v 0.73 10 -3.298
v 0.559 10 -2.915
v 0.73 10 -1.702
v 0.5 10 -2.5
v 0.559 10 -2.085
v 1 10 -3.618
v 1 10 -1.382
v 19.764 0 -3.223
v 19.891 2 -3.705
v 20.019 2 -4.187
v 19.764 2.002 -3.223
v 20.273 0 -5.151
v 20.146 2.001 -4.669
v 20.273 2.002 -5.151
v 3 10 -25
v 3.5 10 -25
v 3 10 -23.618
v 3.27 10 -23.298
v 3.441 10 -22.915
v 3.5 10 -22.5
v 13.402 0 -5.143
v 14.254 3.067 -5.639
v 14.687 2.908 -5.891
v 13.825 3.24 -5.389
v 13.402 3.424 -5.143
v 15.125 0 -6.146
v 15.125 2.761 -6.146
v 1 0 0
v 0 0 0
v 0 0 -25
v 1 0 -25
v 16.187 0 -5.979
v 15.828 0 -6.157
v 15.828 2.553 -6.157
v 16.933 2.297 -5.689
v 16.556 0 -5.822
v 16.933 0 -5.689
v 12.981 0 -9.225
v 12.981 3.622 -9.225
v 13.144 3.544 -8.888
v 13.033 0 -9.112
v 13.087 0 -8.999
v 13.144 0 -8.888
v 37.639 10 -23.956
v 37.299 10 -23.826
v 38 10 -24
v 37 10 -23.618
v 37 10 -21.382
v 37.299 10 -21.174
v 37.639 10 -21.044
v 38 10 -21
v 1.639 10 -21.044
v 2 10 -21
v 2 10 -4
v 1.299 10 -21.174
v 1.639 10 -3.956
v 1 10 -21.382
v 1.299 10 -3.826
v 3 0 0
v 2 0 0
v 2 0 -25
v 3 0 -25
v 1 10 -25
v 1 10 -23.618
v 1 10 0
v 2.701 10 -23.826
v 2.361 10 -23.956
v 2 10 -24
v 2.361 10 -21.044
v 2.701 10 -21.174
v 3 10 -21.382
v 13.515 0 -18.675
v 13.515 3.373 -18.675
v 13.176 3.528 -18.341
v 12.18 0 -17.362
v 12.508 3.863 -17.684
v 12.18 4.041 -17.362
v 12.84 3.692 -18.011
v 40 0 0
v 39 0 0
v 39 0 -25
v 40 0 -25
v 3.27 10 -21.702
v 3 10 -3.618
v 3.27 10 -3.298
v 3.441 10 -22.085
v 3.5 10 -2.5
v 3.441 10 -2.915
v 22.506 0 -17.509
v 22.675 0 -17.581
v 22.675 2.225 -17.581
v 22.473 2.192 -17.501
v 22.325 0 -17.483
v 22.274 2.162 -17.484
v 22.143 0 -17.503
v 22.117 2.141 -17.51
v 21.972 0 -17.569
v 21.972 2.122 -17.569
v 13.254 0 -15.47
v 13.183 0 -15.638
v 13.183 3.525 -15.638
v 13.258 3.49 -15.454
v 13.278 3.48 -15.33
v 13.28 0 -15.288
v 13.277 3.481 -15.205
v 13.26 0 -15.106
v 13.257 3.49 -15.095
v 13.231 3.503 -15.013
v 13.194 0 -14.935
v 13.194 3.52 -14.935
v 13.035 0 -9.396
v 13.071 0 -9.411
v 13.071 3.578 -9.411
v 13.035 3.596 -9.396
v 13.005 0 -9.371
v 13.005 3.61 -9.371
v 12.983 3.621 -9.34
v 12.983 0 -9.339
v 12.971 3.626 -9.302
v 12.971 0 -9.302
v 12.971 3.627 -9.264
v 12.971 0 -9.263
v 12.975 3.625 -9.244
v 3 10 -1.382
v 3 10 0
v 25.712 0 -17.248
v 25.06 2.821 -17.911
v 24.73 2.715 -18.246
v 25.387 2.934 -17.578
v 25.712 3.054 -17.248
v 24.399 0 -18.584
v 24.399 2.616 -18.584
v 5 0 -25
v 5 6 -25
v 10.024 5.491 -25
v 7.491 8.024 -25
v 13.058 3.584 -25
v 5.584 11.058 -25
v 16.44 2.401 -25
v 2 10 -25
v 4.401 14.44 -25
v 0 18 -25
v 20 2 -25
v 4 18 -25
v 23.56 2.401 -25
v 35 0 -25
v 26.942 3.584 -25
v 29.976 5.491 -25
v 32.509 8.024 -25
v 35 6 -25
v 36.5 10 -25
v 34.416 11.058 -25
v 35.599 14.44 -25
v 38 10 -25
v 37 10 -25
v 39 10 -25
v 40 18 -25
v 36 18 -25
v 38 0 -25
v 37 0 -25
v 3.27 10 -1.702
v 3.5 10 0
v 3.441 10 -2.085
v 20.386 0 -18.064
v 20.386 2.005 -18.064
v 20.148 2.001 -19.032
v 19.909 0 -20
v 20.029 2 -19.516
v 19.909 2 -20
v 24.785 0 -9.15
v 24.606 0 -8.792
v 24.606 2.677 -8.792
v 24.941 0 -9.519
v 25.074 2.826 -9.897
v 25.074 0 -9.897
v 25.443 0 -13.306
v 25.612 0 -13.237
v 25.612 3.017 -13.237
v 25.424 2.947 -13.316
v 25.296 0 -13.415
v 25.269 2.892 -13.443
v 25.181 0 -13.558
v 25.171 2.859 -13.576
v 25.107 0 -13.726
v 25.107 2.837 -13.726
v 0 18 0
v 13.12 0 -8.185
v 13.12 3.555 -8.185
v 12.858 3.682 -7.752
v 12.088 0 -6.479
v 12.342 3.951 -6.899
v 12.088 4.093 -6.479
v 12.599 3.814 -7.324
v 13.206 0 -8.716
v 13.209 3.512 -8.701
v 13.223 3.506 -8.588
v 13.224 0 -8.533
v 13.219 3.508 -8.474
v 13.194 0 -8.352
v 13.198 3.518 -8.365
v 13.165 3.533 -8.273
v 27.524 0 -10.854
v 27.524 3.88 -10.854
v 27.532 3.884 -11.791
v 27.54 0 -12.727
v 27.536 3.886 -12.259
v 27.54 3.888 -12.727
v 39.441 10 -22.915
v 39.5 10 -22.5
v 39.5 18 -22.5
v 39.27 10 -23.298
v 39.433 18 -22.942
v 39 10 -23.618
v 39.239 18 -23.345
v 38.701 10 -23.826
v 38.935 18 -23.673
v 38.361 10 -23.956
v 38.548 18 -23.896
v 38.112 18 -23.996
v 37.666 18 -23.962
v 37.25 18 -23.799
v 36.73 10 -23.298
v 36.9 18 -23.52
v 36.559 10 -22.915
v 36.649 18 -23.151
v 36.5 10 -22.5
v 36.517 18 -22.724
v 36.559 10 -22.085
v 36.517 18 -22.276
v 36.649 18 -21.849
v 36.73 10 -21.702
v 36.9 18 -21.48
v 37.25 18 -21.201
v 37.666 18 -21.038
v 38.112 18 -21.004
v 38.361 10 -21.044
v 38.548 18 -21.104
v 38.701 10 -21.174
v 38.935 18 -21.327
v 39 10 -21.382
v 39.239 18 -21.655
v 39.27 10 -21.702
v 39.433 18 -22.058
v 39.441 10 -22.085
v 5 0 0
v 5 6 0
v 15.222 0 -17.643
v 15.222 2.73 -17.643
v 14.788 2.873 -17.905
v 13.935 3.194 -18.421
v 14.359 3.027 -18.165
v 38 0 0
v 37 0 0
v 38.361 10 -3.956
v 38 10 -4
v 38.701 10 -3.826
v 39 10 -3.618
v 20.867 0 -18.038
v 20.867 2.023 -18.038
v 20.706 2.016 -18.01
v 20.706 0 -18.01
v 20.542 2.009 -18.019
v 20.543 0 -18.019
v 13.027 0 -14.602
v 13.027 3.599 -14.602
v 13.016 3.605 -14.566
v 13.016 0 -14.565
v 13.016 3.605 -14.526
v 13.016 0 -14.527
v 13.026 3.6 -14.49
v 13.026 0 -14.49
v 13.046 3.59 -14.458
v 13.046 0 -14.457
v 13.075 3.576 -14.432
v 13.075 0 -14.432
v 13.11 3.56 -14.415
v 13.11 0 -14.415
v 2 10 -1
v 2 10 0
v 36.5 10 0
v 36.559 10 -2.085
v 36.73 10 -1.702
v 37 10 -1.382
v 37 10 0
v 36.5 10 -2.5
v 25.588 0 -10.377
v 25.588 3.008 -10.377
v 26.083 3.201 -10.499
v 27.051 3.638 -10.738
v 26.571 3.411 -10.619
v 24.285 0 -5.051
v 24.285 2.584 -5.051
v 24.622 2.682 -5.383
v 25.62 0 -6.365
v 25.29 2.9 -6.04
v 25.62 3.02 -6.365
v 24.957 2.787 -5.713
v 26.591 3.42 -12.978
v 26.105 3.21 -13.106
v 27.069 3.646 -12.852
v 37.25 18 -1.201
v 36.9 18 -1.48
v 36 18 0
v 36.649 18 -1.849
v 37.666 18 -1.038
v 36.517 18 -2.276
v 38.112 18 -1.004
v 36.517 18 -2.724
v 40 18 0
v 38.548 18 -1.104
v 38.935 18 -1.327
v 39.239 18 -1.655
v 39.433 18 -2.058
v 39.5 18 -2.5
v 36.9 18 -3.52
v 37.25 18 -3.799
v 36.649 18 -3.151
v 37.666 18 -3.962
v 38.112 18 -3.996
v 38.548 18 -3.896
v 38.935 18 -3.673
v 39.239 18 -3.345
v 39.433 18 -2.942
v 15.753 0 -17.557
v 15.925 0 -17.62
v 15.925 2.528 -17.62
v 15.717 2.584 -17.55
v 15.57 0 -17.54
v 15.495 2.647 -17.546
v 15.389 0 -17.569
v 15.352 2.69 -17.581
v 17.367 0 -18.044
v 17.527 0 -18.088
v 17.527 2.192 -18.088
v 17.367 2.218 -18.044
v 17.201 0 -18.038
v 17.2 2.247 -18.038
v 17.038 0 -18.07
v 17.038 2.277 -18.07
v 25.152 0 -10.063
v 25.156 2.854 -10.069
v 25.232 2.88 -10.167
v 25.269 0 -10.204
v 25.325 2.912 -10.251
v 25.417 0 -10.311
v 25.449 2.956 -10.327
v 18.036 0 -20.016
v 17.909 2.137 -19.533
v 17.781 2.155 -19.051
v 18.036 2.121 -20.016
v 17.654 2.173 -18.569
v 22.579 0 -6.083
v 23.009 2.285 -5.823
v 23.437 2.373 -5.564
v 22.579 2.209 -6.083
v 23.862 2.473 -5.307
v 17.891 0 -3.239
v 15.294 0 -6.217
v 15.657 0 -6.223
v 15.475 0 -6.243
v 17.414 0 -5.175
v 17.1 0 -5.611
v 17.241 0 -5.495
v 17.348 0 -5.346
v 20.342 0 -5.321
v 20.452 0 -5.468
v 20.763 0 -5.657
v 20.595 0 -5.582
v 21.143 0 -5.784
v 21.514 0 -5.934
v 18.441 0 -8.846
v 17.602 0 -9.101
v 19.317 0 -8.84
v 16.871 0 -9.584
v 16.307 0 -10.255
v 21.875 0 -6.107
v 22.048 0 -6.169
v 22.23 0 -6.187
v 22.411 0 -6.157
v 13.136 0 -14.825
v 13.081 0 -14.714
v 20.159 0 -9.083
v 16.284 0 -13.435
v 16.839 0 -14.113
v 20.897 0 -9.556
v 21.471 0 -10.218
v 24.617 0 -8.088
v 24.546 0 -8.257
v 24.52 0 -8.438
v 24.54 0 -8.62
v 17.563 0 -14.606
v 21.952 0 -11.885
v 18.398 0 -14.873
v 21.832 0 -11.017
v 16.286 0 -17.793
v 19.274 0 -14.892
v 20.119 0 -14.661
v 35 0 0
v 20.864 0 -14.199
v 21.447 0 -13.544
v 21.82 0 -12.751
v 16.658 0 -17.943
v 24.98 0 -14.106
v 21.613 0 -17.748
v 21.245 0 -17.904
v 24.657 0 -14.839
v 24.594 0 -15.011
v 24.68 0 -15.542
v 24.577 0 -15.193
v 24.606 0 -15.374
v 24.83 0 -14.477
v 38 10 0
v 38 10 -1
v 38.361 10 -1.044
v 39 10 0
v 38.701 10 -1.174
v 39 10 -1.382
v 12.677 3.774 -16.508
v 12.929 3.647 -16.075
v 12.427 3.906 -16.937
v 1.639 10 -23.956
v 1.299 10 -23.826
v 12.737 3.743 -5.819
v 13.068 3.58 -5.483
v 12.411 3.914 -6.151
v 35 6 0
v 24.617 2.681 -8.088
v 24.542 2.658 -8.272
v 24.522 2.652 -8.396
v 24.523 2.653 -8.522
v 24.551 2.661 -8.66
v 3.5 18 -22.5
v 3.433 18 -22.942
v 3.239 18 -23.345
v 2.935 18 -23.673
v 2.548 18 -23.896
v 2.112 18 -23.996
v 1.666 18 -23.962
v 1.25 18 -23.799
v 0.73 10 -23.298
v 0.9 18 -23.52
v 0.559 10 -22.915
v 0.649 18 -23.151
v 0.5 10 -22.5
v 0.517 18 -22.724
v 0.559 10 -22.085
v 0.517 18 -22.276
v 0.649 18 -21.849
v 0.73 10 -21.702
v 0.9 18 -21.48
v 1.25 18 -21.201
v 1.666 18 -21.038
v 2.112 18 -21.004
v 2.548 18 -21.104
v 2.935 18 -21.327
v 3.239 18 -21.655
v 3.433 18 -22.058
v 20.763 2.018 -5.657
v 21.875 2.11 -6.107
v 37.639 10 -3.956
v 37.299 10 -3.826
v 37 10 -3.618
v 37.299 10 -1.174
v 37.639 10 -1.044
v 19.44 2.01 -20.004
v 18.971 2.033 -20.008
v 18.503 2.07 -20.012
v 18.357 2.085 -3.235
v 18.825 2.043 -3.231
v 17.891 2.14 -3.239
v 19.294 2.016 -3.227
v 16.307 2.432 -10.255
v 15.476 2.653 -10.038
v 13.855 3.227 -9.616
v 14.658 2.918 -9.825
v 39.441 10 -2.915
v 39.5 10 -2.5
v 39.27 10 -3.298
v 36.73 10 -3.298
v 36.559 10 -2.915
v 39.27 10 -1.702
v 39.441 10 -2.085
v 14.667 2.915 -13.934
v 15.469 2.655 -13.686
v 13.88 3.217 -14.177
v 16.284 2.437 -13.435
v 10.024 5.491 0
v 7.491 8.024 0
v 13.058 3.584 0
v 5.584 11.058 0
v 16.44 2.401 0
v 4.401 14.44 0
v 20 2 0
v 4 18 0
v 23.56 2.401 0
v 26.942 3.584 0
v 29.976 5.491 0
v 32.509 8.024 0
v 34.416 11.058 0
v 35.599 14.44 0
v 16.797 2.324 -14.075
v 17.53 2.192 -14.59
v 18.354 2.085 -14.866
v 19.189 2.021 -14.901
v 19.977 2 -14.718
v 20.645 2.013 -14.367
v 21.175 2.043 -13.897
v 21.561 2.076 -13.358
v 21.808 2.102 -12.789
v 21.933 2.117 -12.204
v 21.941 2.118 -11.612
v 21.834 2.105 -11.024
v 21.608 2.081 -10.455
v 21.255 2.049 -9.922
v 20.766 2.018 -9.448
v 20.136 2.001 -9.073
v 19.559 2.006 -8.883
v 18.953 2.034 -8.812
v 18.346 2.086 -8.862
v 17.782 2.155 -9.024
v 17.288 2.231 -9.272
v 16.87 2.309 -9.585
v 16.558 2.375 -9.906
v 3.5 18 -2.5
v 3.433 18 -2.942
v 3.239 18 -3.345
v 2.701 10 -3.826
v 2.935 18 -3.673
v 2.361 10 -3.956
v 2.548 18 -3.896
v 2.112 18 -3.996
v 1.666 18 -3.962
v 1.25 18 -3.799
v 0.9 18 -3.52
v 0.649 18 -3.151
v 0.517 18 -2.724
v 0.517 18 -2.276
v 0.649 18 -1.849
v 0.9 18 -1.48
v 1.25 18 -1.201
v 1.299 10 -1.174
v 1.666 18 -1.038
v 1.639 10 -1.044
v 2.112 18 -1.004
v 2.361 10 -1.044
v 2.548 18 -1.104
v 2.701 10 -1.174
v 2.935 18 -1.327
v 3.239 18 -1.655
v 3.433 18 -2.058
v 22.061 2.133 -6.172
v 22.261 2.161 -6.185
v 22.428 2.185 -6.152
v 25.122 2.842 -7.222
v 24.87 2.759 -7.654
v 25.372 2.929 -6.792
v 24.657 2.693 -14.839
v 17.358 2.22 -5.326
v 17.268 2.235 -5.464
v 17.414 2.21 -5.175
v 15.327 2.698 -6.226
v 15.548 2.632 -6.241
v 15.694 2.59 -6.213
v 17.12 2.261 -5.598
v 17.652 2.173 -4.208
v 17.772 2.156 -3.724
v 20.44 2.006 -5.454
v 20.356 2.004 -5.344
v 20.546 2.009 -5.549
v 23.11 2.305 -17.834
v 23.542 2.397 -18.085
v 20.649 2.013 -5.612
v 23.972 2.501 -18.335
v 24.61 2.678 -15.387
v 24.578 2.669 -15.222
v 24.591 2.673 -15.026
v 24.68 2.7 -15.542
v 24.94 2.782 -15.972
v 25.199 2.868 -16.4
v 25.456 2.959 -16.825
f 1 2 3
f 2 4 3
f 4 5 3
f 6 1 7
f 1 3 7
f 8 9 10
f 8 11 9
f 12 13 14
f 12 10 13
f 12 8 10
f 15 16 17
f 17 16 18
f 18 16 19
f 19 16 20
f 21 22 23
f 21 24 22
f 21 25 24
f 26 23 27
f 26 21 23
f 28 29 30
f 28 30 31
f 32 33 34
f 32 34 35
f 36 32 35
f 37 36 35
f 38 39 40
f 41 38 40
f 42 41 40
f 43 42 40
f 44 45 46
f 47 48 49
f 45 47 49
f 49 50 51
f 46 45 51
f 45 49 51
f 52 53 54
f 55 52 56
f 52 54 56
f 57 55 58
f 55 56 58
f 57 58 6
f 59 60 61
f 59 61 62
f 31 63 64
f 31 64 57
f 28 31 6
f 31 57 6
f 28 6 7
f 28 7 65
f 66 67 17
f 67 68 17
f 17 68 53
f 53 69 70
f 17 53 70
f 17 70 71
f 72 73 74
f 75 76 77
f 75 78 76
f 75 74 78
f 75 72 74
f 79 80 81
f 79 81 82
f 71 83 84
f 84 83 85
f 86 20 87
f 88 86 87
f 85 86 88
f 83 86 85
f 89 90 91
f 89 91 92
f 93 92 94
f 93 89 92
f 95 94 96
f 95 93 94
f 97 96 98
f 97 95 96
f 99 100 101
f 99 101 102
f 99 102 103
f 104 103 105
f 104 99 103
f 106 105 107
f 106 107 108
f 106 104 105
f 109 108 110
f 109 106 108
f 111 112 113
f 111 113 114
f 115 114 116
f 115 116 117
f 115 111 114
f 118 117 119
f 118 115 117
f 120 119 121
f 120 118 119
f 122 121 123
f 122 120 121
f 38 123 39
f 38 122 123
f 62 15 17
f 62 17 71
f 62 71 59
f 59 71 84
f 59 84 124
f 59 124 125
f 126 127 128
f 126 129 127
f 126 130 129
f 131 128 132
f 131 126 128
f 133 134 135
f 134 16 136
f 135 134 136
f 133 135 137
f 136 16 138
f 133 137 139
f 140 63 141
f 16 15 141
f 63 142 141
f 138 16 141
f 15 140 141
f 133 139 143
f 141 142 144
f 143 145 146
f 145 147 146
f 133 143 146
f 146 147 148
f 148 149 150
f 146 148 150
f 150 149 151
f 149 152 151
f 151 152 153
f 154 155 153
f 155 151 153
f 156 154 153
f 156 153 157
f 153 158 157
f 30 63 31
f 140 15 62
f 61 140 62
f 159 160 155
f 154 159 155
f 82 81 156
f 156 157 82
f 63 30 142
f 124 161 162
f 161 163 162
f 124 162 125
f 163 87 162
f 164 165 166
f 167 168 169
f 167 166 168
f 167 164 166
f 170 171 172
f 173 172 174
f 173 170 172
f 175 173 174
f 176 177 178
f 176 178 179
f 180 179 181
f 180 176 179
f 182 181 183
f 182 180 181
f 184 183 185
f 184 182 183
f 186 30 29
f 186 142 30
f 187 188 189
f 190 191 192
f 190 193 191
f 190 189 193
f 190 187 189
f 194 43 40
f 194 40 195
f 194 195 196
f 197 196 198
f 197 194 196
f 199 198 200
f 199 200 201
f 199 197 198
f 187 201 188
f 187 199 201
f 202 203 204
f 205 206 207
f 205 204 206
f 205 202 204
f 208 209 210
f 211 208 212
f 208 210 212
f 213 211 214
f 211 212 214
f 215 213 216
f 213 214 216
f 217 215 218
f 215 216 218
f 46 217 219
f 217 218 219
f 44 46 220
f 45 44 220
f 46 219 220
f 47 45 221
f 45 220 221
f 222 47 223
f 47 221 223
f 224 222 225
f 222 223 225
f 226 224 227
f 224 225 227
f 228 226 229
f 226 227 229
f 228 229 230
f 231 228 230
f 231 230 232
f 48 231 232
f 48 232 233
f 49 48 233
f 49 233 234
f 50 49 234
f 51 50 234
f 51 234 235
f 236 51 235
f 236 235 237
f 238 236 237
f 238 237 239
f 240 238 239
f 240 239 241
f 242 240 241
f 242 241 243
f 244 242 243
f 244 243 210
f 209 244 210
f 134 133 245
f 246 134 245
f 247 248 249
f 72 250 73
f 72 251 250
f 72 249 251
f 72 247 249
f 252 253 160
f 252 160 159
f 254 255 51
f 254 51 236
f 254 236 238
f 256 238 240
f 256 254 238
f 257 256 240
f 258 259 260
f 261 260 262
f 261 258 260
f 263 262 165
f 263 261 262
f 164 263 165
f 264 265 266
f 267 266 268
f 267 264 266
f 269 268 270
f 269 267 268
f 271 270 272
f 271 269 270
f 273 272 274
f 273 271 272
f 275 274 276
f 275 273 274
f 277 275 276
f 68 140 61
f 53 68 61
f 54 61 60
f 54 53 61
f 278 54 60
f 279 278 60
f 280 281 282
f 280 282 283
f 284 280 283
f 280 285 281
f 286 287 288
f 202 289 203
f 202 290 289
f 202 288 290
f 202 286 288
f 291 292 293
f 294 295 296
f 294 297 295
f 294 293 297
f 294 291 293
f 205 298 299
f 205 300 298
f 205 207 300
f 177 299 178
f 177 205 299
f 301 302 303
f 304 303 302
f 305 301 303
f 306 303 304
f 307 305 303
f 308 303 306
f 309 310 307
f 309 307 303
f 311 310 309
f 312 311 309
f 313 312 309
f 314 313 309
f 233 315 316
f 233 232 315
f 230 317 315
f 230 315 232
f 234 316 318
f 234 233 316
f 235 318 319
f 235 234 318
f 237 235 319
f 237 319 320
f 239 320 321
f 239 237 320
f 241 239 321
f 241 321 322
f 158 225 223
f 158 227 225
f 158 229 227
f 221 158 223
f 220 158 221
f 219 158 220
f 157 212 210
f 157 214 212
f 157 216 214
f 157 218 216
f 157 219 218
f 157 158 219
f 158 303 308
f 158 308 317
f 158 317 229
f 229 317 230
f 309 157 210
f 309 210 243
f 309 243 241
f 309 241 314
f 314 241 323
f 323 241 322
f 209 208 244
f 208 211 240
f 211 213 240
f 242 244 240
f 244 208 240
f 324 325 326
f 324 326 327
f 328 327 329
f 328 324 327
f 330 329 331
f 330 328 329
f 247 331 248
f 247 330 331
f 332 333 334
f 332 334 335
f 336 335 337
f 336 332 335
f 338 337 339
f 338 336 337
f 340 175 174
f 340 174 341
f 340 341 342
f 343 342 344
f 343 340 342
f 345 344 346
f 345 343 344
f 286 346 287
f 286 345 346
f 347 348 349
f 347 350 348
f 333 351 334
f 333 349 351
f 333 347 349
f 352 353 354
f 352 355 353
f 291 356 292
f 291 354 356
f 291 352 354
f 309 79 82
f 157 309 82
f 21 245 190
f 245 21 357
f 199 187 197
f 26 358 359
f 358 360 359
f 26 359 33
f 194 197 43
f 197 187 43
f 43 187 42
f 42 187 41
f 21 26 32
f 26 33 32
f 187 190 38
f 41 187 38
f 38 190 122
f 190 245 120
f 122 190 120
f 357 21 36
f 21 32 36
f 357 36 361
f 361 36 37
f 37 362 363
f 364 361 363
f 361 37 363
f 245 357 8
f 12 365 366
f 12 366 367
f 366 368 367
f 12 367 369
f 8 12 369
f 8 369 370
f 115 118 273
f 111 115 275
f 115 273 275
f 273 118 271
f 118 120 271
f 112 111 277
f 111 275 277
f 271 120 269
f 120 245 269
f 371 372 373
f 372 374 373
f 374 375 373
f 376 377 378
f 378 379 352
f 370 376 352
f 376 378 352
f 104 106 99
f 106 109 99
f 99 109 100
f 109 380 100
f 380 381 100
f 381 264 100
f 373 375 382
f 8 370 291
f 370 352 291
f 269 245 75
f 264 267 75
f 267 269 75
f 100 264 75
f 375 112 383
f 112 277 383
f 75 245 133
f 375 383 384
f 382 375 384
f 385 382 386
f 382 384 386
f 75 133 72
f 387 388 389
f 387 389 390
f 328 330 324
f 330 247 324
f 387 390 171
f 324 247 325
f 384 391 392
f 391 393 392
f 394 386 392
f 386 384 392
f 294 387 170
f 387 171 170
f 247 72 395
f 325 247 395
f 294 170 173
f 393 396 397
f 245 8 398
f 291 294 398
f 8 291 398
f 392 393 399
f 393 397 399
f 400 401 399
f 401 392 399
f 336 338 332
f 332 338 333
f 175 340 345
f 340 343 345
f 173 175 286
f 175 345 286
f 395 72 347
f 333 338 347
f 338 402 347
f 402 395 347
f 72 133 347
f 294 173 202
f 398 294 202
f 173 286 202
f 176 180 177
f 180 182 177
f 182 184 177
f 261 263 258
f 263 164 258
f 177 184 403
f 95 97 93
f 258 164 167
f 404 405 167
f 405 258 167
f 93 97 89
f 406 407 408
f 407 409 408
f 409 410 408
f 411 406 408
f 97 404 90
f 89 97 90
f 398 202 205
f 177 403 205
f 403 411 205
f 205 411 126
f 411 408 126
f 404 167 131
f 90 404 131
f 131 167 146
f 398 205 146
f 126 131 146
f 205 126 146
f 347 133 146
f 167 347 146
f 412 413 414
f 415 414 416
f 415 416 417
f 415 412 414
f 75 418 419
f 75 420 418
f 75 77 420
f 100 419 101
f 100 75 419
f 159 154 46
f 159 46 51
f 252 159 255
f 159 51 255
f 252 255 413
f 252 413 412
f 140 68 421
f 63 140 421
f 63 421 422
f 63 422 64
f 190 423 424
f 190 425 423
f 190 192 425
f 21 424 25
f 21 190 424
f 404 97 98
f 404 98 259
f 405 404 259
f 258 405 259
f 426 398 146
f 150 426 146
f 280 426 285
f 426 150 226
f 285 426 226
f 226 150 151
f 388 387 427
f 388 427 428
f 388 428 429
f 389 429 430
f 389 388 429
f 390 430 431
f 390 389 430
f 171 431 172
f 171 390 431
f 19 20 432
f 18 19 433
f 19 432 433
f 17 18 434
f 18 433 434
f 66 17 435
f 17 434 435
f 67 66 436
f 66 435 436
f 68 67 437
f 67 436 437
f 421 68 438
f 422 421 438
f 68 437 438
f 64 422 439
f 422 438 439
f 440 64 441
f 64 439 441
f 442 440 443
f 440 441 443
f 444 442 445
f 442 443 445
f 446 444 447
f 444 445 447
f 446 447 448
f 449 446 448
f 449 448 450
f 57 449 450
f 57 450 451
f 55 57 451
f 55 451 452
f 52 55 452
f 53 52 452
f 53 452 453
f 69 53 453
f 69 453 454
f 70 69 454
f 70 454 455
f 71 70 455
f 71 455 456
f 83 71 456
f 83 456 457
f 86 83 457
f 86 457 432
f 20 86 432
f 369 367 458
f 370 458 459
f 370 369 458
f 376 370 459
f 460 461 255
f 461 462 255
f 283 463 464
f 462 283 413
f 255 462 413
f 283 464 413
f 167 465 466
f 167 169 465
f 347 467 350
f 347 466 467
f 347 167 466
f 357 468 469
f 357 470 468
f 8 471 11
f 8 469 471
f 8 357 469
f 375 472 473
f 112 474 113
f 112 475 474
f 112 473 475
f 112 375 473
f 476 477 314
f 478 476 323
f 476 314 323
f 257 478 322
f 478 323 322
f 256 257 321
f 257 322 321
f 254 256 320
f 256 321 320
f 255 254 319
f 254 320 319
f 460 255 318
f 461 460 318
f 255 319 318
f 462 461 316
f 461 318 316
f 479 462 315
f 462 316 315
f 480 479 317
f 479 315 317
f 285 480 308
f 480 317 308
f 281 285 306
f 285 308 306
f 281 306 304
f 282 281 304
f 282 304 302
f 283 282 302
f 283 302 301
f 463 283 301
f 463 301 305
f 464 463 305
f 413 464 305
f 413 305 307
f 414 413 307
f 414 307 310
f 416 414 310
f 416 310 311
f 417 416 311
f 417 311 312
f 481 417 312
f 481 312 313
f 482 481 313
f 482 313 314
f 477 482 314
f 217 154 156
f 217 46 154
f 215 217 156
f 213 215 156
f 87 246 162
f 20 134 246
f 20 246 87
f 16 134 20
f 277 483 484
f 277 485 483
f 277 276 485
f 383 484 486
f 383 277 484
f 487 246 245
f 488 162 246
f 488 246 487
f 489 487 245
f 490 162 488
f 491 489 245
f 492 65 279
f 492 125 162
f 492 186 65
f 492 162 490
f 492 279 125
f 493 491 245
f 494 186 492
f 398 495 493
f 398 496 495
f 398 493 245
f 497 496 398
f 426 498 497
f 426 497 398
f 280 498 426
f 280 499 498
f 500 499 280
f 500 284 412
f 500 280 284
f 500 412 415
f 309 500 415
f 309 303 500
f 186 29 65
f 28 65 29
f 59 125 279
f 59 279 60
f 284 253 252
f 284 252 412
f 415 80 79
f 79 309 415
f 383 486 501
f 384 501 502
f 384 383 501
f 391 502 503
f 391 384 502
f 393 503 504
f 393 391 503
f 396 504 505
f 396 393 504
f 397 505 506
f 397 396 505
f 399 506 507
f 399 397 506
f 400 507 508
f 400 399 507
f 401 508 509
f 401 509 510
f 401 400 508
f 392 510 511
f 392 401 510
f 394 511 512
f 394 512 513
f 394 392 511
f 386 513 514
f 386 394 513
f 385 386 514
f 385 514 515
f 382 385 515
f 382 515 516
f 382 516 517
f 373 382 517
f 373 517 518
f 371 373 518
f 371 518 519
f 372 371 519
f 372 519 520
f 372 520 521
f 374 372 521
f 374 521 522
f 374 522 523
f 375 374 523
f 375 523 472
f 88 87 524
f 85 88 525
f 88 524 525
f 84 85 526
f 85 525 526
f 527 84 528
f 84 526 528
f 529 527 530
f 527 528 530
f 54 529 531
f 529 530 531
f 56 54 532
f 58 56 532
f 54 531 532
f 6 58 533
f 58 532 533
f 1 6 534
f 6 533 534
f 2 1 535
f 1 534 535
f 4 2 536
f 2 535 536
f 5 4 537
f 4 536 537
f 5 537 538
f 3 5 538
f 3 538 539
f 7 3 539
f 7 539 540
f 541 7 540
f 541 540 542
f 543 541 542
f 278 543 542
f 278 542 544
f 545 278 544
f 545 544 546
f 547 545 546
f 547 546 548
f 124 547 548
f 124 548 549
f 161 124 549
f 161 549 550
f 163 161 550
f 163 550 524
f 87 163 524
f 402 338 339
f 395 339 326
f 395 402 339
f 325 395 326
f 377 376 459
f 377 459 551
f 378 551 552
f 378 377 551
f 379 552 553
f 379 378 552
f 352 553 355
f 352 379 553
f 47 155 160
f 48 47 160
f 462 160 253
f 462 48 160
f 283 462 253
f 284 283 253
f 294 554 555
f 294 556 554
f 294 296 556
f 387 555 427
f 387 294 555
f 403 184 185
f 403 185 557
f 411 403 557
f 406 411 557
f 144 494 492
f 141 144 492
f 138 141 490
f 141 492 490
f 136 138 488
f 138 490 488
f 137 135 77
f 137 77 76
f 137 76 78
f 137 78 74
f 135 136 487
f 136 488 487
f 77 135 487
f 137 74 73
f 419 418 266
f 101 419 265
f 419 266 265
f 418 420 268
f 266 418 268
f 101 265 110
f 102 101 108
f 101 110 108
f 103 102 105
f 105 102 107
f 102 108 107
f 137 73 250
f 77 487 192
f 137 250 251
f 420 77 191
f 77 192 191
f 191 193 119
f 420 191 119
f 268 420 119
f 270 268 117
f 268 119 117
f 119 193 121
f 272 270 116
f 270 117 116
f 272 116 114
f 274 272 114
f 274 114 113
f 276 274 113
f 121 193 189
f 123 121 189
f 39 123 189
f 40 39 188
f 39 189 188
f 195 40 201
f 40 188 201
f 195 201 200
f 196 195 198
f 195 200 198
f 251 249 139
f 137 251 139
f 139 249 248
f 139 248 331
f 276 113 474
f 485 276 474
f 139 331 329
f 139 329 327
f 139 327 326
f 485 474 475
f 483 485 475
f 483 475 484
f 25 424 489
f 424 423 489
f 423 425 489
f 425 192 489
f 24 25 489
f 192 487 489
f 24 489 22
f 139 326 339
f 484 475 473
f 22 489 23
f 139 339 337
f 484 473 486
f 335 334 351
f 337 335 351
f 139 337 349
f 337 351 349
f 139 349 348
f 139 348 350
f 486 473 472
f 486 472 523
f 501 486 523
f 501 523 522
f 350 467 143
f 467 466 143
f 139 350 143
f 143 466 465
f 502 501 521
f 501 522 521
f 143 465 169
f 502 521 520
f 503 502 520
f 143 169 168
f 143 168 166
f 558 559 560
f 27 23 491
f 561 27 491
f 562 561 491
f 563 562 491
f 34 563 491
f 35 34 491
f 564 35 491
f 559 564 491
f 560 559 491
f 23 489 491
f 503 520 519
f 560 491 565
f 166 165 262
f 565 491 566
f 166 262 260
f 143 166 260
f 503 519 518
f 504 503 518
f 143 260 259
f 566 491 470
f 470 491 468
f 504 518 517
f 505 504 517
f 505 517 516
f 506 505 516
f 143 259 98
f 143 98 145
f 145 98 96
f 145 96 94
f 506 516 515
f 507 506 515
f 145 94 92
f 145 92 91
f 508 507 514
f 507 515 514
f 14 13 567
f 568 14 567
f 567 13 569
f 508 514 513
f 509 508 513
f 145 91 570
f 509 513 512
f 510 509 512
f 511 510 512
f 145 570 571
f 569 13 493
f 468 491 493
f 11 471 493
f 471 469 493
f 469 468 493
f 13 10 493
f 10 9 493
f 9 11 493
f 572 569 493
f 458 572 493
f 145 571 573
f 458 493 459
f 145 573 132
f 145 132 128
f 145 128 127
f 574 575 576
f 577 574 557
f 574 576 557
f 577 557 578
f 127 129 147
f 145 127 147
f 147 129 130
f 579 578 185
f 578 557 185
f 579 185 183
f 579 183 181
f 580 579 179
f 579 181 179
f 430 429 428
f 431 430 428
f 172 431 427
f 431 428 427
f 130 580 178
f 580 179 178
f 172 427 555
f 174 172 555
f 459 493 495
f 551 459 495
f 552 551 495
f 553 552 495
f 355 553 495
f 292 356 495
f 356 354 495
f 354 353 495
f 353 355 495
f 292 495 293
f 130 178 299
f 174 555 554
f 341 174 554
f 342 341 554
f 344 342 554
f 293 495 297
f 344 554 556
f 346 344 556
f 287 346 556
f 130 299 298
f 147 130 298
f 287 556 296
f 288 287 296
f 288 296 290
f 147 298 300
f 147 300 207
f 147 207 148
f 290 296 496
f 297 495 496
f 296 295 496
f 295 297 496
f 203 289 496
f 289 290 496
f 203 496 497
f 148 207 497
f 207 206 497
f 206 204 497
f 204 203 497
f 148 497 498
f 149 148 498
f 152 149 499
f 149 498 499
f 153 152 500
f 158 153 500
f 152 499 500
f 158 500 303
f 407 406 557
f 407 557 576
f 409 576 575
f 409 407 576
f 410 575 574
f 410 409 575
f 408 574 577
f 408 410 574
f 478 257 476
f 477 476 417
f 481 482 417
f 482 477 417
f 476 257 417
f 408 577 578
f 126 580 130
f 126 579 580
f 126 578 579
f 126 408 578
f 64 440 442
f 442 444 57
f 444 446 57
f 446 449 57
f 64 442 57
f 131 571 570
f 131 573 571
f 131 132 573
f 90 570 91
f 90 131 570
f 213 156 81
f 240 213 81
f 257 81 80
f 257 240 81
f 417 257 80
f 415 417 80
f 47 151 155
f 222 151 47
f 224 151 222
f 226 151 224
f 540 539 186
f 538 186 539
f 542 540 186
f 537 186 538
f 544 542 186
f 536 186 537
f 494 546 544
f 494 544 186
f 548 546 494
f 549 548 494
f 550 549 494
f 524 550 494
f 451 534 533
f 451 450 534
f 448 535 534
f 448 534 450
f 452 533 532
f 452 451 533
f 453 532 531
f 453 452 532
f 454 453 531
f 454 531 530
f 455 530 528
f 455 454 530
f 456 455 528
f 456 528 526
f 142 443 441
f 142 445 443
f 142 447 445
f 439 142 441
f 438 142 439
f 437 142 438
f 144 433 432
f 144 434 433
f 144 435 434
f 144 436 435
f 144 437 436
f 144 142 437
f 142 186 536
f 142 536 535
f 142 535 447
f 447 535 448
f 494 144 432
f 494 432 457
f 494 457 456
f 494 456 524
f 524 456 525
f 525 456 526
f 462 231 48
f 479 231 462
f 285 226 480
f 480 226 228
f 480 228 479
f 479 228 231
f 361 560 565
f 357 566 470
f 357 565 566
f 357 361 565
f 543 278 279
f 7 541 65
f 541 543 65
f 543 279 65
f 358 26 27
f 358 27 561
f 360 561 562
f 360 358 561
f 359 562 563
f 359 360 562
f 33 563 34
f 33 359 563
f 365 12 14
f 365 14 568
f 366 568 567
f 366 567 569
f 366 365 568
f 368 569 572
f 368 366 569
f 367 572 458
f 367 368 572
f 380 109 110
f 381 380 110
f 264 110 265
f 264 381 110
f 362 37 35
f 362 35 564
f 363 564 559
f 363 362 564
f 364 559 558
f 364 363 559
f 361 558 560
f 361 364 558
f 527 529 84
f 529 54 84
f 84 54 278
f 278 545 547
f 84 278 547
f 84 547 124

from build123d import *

# Parameters (mm, degrees)
CROQUIS1_W              = 40
CROQUIS1_H              = 25
SALIENTE_EXTRUIR1_DEPTH = 18
CROQUIS2_R              = 16
CORTAR_EXTRUIR1_DEPTH   = 26
CROQUIS3_R              = 1.5
CORTAR_EXTRUIR2_DEPTH   = 19
CORTAR_EXTRUIR3_DEPTH   = 10
SALIENTE_EXTRUIR2_DEPTH = 25
CROQUIS6_W              = 1
CROQUIS6_H              = 25
SALIENTE_EXTRUIR3_DEPTH = 10


with BuildPart() as part:
    # Croquis1 → Saliente-Extruir1 (new body)
    with BuildSketch(Plane(origin=(0, 0, 0), x_dir=(1, 0, 0), z_dir=(0, 1, 0))):
        with Locations((20, 12.5)):
            Rectangle(CROQUIS1_W, CROQUIS1_H)
    extrude(amount=SALIENTE_EXTRUIR1_DEPTH)

    # Croquis2 → Cortar-Extruir1 (cut, through all)
    with BuildSketch(Plane.XY):
        with Locations((20, 18)):
            Circle(CROQUIS2_R)
    extrude(amount=-CORTAR_EXTRUIR1_DEPTH, mode=Mode.SUBTRACT)

    # Croquis3 → Cortar-Extruir2 (cut, through all)
    with BuildSketch(Plane(origin=(0, 18, 0), x_dir=(1, 0, 0), z_dir=(0, 1, 0))):
        with Locations((2, 2.5)):
            Circle(CROQUIS3_R)
        with Locations((2, 22.5)):
            Circle(CROQUIS3_R)
        with Locations((38, 2.5)):
            Circle(CROQUIS3_R)
        with Locations((38, 22.5)):
            Circle(CROQUIS3_R)
    extrude(amount=-CORTAR_EXTRUIR2_DEPTH, mode=Mode.SUBTRACT)

    # Croquis4 → Cortar-Extruir3 (cut)
    with BuildSketch(Plane.XZ):
        with BuildLine():
            Line((12.088237667, -6.478545635), (13.401635398, -5.142871626))
            Line((13.401635398, -5.142871626), (15.124961017, -6.145817155))
            ThreePointArc((15.124961017, -6.145817155), (15.475165724, -6.243431571), (15.828418521, -6.157499195))
            ThreePointArc((15.828418521, -6.157499195), (16.370055517, -5.897538787), (16.933440791, -5.688859407))
            ThreePointArc((16.933440791, -5.688859407), (17.240768872, -5.494639527), (17.414026723, -5.175024714))
            Line((17.414026723, -5.175024714), (17.890921137, -3.238966182))
            Line((17.890921137, -3.238966182), (19.764097728, -3.223214474))
            Line((19.764097728, -3.223214474), (20.273483375, -5.15097929))
            ThreePointArc((20.273483375, -5.15097929), (20.452091683, -5.467635229), (20.762642496, -5.656659312))
            ThreePointArc((20.762642496, -5.656659312), (21.329457457, -5.855834737), (21.875389609, -6.10664968))
            ThreePointArc((21.875389609, -6.10664968), (22.230037574, -6.186629256), (22.578551176, -6.083139256))
            Line((22.578551176, -6.083139256), (24.284766568, -5.051354413))
            Line((24.284766568, -5.051354413), (25.620440577, -6.364752144))
            Line((25.620440577, -6.364752144), (24.617495048, -8.088077763))
            ThreePointArc((24.617495048, -8.088077763), (24.519880632, -8.43828247), (24.605813007, -8.791535267))
            ThreePointArc((24.605813007, -8.791535267), (24.865773416, -9.333172263), (25.074452795, -9.896557537))
            ThreePointArc((25.074452795, -9.896557537), (25.268672676, -10.203885618), (25.588287488, -10.377143469))
            Line((25.588287488, -10.377143469), (27.524346021, -10.854037883))
            Line((27.524346021, -10.854037883), (27.540097728, -12.727214474))
            Line((27.540097728, -12.727214474), (25.612332912, -13.236600121))
            ThreePointArc((25.612332912, -13.236600121), (25.295676973, -13.415208429), (25.106652891, -13.725759242))
            ThreePointArc((25.106652891, -13.725759242), (24.907477465, -14.292574203), (24.656662522, -14.838506355))
            ThreePointArc((24.656662522, -14.838506355), (24.576682946, -15.19315432), (24.680172947, -15.541667922))
            Line((24.680172947, -15.541667922), (25.711957789, -17.247883314))
            Line((25.711957789, -17.247883314), (24.398560059, -18.583557323))
            Line((24.398560059, -18.583557323), (22.67523444, -17.580611794))
            ThreePointArc((22.67523444, -17.580611794), (22.325029732, -17.482997378), (21.971776936, -17.568929753))
            ThreePointArc((21.971776936, -17.568929753), (21.430139939, -17.828890162), (20.866754665, -18.037569541))
            ThreePointArc((20.866754665, -18.037569541), (20.6241928, -18.009408471), (20.386168733, -18.063941468))
            Line((20.386168733, -18.063941468), (19.909274319, -20))
            Line((19.909274319, -20), (18.036097728, -20.015751708))
            Line((18.036097728, -20.015751708), (17.526712081, -18.087986892))
            ThreePointArc((17.526712081, -18.087986892), (17.283728175, -18.036032676), (17.03755296, -18.069769637))
            ThreePointArc((17.03755296, -18.069769637), (16.470737999, -17.870594211), (15.924805848, -17.619779268))
            ThreePointArc((15.924805848, -17.619779268), (15.570157883, -17.539799692), (15.22164428, -17.643289693))
            Line((15.22164428, -17.643289693), (13.515428889, -18.675074535))
            Line((13.515428889, -18.675074535), (12.17975488, -17.361676805))
            Line((12.17975488, -17.361676805), (13.182700409, -15.638351186))
            ThreePointArc((13.182700409, -15.638351186), (13.280314825, -15.288146478), (13.194382449, -14.934893682))
            ThreePointArc((13.194382449, -14.934893682), (13.1083452, -14.769415199), (13.027105933, -14.601529171))
            ThreePointArc((13.027105933, -14.601529171), (13.02605148, -14.489666601), (13.109673231, -14.415358127))
            Line((13.109673231, -14.415358127), (16.284140051, -13.434659859))
            ThreePointArc((16.284140051, -13.434659859), (21.951688309, -11.884896122), (16.306733365, -10.25475669))
            Line((16.306733365, -10.25475669), (13.070699975, -9.410888594))
            ThreePointArc((13.070699975, -9.410888594), (12.983034926, -9.338706443), (12.981392618, -9.2251603))
            ThreePointArc((12.981392618, -9.2251603), (13.060028024, -9.055370844), (13.143532934, -8.887922594))
            ThreePointArc((13.143532934, -8.887922594), (13.22351251, -8.533274629), (13.12002251, -8.184761026))
            Line((13.12002251, -8.184761026), (12.088237667, -6.478545635))
        make_face()
        Polygon((5, -20), (5, -25), (0, -25), (0, -20), (0, -5), (0, 0), (5, 0), (5, -5), align=None)
        Polygon((35, 0), (35, -5), (35, -20), (35, -25), (40, -25), (40, -20), (40, -5), (40, 0), align=None)
    extrude(amount=-CORTAR_EXTRUIR3_DEPTH, mode=Mode.SUBTRACT)

    # Croquis5 → Saliente-Extruir2 (add)
    with BuildSketch(Plane(origin=(0, 0, -25), x_dir=(-1, 0, 0), z_dir=(0, 0, -1))):
        Polygon((-5, 10), (-5, 6), (-3.5, 10), align=None)
        Polygon((-35, 10), (-35, 6), (-36.5, 10), align=None)
    extrude(amount=-SALIENTE_EXTRUIR2_DEPTH)

    # Croquis6 → Saliente-Extruir3 (add)
    with BuildSketch(Plane.XZ.offset(-10)):
        with Locations((0.5, -12.5)):
            Rectangle(CROQUIS6_W, CROQUIS6_H)
        with Locations((39.5, -12.5)):
            Rectangle(CROQUIS6_W, CROQUIS6_H)
        with Locations((2.5, -12.5)):
            Rectangle(CROQUIS6_W, CROQUIS6_H)
        with Locations((37.5, -12.5)):
            Rectangle(CROQUIS6_W, CROQUIS6_H)
    extrude(amount=SALIENTE_EXTRUIR3_DEPTH)


solid = part.part
